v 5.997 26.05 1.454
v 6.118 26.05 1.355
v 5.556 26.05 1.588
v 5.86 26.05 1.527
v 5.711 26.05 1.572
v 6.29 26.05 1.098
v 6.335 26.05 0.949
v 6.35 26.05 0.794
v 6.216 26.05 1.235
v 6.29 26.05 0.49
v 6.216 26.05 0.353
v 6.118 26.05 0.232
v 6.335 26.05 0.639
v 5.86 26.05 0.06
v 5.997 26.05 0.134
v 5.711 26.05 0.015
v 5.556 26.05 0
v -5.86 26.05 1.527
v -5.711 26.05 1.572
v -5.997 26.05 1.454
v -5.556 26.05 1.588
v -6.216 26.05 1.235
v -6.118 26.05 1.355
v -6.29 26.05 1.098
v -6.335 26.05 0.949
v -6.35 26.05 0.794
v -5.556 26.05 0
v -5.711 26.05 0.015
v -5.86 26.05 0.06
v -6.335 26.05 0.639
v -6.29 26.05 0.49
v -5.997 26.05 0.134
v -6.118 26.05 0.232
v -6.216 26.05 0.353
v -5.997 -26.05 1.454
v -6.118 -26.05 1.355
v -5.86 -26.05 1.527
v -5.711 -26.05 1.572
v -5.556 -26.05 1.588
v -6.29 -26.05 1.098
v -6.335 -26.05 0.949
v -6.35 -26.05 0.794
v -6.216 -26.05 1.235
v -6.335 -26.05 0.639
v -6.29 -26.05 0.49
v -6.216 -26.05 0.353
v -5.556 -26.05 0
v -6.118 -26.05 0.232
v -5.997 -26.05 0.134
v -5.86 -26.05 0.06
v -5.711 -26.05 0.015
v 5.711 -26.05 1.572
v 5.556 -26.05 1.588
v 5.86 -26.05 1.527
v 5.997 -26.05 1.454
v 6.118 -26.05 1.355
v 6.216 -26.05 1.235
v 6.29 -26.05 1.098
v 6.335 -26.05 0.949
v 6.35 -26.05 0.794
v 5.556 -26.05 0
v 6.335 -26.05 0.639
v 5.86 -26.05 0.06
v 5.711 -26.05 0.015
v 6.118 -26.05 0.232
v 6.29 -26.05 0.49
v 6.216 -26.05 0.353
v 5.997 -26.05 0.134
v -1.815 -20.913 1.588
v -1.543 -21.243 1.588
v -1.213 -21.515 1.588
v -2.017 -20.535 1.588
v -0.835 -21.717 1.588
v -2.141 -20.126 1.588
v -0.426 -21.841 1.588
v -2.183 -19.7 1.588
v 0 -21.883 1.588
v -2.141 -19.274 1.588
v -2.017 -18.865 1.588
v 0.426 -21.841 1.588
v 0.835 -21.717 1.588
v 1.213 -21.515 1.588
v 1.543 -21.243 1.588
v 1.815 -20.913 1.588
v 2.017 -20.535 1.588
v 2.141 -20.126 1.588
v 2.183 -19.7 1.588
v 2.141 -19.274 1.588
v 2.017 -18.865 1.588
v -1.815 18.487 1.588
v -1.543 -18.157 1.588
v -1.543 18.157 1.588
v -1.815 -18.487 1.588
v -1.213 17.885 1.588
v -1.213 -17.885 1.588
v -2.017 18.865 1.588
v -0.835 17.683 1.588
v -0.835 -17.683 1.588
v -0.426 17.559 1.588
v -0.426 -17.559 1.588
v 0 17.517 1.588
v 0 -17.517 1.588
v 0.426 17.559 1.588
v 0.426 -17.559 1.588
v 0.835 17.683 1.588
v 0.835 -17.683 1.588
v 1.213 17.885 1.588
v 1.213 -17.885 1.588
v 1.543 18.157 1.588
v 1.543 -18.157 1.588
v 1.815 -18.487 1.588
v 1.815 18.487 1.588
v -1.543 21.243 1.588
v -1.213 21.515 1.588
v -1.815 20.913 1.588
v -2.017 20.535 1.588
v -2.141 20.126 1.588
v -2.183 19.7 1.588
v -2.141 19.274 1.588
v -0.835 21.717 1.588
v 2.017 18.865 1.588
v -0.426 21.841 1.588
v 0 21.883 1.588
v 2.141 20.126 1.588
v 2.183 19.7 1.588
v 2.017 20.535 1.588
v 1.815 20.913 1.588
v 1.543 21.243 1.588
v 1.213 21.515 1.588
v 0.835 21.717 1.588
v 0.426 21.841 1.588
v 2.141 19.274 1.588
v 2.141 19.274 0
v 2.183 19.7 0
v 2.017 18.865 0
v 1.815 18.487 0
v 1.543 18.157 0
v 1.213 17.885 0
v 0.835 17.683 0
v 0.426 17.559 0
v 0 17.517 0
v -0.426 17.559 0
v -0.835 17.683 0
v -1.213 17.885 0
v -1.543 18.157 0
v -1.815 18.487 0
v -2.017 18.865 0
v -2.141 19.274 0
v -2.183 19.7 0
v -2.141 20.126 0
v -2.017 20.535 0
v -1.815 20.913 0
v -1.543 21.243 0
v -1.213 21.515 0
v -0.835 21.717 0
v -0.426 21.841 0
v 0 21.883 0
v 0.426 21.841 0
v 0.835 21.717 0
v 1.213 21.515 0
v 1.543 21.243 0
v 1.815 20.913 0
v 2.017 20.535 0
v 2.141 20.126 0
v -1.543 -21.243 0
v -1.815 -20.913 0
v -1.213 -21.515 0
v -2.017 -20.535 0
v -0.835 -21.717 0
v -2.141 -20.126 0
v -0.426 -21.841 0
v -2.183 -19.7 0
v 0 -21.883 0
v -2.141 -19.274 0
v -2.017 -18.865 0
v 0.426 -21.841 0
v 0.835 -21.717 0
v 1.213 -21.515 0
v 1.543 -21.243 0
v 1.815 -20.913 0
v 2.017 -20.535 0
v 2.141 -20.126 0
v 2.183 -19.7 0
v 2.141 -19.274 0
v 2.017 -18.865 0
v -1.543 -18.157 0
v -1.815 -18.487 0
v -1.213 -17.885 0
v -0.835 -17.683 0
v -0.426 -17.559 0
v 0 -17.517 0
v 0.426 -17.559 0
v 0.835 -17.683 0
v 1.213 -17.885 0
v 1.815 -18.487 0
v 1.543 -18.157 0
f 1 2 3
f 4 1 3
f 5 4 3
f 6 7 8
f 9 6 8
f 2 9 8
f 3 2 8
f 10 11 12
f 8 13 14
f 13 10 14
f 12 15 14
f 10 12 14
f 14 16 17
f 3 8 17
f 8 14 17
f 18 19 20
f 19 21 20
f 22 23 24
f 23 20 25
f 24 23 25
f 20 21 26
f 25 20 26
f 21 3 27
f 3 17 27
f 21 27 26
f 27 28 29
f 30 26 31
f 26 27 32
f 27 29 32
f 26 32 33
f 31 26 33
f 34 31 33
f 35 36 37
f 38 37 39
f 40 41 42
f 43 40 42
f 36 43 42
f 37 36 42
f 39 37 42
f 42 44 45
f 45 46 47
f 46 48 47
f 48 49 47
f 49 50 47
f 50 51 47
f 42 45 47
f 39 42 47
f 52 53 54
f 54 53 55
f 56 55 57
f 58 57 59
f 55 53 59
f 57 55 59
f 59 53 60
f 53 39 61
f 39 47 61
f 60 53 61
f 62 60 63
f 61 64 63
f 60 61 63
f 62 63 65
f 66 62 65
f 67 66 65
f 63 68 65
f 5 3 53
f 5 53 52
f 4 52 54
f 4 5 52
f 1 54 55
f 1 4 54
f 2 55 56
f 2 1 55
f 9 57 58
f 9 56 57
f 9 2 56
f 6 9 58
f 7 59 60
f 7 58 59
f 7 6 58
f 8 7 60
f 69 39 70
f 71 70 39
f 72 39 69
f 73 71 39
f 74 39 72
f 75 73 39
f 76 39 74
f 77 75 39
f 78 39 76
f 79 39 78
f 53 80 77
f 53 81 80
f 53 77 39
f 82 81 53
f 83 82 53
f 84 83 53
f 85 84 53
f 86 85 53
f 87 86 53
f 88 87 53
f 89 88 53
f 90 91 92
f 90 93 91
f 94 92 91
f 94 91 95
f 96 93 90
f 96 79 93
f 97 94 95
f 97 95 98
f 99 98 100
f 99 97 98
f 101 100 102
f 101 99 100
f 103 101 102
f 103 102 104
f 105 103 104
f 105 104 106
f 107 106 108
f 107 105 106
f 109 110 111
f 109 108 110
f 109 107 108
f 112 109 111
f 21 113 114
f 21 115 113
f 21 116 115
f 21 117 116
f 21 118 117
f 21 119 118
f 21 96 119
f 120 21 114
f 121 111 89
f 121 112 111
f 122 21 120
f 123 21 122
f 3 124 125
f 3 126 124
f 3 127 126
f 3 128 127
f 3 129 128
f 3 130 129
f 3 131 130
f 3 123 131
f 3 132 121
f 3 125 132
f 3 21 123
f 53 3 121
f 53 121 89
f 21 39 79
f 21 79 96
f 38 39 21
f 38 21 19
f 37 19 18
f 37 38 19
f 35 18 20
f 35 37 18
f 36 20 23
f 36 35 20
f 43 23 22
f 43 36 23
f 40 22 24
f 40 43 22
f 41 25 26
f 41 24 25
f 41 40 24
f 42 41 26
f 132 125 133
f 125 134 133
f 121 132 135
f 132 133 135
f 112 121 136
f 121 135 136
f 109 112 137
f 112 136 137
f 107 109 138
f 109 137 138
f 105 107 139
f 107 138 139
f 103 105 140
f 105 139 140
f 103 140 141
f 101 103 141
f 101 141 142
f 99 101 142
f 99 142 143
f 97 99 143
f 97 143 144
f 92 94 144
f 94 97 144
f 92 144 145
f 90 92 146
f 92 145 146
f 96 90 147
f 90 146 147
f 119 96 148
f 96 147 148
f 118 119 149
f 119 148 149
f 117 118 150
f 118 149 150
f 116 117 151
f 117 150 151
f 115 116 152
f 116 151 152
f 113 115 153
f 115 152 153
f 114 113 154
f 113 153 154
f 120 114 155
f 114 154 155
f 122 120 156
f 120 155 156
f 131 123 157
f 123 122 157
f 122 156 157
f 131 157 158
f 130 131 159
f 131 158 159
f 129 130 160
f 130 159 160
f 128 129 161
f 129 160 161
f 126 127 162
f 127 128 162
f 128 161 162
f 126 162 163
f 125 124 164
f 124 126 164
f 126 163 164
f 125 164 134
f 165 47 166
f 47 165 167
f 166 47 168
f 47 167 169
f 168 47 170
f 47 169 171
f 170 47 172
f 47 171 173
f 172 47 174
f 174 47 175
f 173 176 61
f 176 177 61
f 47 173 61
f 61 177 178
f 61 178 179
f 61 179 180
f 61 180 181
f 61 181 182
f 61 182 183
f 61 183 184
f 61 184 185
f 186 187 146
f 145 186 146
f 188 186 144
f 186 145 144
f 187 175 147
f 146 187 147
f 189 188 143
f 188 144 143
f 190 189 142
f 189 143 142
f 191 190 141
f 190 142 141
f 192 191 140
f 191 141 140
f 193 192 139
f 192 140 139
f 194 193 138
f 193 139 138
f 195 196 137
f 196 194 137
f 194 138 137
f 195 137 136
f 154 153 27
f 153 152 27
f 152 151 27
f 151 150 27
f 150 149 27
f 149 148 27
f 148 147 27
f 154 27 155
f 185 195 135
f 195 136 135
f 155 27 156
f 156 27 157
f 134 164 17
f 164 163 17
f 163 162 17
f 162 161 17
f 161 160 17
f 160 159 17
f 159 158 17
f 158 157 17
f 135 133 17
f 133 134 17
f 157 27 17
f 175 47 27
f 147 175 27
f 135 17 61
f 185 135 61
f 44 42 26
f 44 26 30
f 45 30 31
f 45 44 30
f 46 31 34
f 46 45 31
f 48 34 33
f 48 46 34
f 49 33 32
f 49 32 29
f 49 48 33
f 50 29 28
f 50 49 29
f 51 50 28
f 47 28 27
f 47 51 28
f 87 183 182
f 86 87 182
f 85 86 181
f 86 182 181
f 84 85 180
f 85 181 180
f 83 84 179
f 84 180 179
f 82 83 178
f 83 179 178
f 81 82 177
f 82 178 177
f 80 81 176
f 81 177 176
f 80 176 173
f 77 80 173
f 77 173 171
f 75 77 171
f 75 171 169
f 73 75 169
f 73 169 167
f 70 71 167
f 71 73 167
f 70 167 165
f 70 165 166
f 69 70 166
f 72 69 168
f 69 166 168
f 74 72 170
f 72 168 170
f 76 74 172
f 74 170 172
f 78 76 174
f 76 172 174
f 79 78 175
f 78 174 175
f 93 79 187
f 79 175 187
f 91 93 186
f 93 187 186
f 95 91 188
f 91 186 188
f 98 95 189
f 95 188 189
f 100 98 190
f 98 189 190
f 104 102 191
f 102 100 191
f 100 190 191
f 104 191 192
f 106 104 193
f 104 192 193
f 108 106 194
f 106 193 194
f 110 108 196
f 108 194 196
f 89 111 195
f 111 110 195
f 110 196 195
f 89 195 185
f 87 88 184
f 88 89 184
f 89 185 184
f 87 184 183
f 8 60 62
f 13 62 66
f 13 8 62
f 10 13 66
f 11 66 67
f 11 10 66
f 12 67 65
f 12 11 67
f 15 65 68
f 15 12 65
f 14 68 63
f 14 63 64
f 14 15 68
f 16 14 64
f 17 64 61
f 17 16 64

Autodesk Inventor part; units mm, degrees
ref_plane "YZ Plane" through (0, 0, 0) normal (1, 0, 0) x (0, 1, 0)
ref_plane "XZ Plane" through (0, 0, 0) normal (0, 1, 0) x (-1, 0, 0)
ref_plane "XY Plane" through (0, 0, 0) normal (0, 0, 1) x (1, 0, 0)
sketch "Sketch1" plane through (0, 0, 0) normal (0, 0, 1) x (1, 0, 0)
  circle A0 centre (0, 19.7) radius 2.1828
  circle A1 centre (0, -19.7) radius 2.1828
  line L0 (-6.35, -26.05) -> (6.35, -26.05)
  line L1 (6.35, -26.05) -> (6.35, 26.05)
  line L2 (6.35, 26.05) -> (-6.35, 26.05)
  line L3 (-6.35, 26.05) -> (-6.35, -26.05)
  line L4 (-6.35, -26.05) -> (6.35, 26.05) construction
  line L5 (6.35, -26.05) -> (-6.35, 26.05) construction
  point P0 (0, 0)
  dimension "d0" = 4.3656
  dimension "d1" = 4.3656
  dimension "d2" = 19.7
  dimension "d3" = 39.4
  dimension "d4" = 12.7
  dimension "d5" = 6.35
  dimension "d6" = 6.35
  dimension "d7" = 6.35
extrude "Extrusion1" add sketch "Sketch1" along normal blind 1.5875
fillet "Fillet1" radius 0.7937 4 edges at (-6.35, 0, 0) (-6.35, 0, 1.5875) (6.35, 0, 0) (6.35, 0, 1.5875)
properties part number "Part F"
